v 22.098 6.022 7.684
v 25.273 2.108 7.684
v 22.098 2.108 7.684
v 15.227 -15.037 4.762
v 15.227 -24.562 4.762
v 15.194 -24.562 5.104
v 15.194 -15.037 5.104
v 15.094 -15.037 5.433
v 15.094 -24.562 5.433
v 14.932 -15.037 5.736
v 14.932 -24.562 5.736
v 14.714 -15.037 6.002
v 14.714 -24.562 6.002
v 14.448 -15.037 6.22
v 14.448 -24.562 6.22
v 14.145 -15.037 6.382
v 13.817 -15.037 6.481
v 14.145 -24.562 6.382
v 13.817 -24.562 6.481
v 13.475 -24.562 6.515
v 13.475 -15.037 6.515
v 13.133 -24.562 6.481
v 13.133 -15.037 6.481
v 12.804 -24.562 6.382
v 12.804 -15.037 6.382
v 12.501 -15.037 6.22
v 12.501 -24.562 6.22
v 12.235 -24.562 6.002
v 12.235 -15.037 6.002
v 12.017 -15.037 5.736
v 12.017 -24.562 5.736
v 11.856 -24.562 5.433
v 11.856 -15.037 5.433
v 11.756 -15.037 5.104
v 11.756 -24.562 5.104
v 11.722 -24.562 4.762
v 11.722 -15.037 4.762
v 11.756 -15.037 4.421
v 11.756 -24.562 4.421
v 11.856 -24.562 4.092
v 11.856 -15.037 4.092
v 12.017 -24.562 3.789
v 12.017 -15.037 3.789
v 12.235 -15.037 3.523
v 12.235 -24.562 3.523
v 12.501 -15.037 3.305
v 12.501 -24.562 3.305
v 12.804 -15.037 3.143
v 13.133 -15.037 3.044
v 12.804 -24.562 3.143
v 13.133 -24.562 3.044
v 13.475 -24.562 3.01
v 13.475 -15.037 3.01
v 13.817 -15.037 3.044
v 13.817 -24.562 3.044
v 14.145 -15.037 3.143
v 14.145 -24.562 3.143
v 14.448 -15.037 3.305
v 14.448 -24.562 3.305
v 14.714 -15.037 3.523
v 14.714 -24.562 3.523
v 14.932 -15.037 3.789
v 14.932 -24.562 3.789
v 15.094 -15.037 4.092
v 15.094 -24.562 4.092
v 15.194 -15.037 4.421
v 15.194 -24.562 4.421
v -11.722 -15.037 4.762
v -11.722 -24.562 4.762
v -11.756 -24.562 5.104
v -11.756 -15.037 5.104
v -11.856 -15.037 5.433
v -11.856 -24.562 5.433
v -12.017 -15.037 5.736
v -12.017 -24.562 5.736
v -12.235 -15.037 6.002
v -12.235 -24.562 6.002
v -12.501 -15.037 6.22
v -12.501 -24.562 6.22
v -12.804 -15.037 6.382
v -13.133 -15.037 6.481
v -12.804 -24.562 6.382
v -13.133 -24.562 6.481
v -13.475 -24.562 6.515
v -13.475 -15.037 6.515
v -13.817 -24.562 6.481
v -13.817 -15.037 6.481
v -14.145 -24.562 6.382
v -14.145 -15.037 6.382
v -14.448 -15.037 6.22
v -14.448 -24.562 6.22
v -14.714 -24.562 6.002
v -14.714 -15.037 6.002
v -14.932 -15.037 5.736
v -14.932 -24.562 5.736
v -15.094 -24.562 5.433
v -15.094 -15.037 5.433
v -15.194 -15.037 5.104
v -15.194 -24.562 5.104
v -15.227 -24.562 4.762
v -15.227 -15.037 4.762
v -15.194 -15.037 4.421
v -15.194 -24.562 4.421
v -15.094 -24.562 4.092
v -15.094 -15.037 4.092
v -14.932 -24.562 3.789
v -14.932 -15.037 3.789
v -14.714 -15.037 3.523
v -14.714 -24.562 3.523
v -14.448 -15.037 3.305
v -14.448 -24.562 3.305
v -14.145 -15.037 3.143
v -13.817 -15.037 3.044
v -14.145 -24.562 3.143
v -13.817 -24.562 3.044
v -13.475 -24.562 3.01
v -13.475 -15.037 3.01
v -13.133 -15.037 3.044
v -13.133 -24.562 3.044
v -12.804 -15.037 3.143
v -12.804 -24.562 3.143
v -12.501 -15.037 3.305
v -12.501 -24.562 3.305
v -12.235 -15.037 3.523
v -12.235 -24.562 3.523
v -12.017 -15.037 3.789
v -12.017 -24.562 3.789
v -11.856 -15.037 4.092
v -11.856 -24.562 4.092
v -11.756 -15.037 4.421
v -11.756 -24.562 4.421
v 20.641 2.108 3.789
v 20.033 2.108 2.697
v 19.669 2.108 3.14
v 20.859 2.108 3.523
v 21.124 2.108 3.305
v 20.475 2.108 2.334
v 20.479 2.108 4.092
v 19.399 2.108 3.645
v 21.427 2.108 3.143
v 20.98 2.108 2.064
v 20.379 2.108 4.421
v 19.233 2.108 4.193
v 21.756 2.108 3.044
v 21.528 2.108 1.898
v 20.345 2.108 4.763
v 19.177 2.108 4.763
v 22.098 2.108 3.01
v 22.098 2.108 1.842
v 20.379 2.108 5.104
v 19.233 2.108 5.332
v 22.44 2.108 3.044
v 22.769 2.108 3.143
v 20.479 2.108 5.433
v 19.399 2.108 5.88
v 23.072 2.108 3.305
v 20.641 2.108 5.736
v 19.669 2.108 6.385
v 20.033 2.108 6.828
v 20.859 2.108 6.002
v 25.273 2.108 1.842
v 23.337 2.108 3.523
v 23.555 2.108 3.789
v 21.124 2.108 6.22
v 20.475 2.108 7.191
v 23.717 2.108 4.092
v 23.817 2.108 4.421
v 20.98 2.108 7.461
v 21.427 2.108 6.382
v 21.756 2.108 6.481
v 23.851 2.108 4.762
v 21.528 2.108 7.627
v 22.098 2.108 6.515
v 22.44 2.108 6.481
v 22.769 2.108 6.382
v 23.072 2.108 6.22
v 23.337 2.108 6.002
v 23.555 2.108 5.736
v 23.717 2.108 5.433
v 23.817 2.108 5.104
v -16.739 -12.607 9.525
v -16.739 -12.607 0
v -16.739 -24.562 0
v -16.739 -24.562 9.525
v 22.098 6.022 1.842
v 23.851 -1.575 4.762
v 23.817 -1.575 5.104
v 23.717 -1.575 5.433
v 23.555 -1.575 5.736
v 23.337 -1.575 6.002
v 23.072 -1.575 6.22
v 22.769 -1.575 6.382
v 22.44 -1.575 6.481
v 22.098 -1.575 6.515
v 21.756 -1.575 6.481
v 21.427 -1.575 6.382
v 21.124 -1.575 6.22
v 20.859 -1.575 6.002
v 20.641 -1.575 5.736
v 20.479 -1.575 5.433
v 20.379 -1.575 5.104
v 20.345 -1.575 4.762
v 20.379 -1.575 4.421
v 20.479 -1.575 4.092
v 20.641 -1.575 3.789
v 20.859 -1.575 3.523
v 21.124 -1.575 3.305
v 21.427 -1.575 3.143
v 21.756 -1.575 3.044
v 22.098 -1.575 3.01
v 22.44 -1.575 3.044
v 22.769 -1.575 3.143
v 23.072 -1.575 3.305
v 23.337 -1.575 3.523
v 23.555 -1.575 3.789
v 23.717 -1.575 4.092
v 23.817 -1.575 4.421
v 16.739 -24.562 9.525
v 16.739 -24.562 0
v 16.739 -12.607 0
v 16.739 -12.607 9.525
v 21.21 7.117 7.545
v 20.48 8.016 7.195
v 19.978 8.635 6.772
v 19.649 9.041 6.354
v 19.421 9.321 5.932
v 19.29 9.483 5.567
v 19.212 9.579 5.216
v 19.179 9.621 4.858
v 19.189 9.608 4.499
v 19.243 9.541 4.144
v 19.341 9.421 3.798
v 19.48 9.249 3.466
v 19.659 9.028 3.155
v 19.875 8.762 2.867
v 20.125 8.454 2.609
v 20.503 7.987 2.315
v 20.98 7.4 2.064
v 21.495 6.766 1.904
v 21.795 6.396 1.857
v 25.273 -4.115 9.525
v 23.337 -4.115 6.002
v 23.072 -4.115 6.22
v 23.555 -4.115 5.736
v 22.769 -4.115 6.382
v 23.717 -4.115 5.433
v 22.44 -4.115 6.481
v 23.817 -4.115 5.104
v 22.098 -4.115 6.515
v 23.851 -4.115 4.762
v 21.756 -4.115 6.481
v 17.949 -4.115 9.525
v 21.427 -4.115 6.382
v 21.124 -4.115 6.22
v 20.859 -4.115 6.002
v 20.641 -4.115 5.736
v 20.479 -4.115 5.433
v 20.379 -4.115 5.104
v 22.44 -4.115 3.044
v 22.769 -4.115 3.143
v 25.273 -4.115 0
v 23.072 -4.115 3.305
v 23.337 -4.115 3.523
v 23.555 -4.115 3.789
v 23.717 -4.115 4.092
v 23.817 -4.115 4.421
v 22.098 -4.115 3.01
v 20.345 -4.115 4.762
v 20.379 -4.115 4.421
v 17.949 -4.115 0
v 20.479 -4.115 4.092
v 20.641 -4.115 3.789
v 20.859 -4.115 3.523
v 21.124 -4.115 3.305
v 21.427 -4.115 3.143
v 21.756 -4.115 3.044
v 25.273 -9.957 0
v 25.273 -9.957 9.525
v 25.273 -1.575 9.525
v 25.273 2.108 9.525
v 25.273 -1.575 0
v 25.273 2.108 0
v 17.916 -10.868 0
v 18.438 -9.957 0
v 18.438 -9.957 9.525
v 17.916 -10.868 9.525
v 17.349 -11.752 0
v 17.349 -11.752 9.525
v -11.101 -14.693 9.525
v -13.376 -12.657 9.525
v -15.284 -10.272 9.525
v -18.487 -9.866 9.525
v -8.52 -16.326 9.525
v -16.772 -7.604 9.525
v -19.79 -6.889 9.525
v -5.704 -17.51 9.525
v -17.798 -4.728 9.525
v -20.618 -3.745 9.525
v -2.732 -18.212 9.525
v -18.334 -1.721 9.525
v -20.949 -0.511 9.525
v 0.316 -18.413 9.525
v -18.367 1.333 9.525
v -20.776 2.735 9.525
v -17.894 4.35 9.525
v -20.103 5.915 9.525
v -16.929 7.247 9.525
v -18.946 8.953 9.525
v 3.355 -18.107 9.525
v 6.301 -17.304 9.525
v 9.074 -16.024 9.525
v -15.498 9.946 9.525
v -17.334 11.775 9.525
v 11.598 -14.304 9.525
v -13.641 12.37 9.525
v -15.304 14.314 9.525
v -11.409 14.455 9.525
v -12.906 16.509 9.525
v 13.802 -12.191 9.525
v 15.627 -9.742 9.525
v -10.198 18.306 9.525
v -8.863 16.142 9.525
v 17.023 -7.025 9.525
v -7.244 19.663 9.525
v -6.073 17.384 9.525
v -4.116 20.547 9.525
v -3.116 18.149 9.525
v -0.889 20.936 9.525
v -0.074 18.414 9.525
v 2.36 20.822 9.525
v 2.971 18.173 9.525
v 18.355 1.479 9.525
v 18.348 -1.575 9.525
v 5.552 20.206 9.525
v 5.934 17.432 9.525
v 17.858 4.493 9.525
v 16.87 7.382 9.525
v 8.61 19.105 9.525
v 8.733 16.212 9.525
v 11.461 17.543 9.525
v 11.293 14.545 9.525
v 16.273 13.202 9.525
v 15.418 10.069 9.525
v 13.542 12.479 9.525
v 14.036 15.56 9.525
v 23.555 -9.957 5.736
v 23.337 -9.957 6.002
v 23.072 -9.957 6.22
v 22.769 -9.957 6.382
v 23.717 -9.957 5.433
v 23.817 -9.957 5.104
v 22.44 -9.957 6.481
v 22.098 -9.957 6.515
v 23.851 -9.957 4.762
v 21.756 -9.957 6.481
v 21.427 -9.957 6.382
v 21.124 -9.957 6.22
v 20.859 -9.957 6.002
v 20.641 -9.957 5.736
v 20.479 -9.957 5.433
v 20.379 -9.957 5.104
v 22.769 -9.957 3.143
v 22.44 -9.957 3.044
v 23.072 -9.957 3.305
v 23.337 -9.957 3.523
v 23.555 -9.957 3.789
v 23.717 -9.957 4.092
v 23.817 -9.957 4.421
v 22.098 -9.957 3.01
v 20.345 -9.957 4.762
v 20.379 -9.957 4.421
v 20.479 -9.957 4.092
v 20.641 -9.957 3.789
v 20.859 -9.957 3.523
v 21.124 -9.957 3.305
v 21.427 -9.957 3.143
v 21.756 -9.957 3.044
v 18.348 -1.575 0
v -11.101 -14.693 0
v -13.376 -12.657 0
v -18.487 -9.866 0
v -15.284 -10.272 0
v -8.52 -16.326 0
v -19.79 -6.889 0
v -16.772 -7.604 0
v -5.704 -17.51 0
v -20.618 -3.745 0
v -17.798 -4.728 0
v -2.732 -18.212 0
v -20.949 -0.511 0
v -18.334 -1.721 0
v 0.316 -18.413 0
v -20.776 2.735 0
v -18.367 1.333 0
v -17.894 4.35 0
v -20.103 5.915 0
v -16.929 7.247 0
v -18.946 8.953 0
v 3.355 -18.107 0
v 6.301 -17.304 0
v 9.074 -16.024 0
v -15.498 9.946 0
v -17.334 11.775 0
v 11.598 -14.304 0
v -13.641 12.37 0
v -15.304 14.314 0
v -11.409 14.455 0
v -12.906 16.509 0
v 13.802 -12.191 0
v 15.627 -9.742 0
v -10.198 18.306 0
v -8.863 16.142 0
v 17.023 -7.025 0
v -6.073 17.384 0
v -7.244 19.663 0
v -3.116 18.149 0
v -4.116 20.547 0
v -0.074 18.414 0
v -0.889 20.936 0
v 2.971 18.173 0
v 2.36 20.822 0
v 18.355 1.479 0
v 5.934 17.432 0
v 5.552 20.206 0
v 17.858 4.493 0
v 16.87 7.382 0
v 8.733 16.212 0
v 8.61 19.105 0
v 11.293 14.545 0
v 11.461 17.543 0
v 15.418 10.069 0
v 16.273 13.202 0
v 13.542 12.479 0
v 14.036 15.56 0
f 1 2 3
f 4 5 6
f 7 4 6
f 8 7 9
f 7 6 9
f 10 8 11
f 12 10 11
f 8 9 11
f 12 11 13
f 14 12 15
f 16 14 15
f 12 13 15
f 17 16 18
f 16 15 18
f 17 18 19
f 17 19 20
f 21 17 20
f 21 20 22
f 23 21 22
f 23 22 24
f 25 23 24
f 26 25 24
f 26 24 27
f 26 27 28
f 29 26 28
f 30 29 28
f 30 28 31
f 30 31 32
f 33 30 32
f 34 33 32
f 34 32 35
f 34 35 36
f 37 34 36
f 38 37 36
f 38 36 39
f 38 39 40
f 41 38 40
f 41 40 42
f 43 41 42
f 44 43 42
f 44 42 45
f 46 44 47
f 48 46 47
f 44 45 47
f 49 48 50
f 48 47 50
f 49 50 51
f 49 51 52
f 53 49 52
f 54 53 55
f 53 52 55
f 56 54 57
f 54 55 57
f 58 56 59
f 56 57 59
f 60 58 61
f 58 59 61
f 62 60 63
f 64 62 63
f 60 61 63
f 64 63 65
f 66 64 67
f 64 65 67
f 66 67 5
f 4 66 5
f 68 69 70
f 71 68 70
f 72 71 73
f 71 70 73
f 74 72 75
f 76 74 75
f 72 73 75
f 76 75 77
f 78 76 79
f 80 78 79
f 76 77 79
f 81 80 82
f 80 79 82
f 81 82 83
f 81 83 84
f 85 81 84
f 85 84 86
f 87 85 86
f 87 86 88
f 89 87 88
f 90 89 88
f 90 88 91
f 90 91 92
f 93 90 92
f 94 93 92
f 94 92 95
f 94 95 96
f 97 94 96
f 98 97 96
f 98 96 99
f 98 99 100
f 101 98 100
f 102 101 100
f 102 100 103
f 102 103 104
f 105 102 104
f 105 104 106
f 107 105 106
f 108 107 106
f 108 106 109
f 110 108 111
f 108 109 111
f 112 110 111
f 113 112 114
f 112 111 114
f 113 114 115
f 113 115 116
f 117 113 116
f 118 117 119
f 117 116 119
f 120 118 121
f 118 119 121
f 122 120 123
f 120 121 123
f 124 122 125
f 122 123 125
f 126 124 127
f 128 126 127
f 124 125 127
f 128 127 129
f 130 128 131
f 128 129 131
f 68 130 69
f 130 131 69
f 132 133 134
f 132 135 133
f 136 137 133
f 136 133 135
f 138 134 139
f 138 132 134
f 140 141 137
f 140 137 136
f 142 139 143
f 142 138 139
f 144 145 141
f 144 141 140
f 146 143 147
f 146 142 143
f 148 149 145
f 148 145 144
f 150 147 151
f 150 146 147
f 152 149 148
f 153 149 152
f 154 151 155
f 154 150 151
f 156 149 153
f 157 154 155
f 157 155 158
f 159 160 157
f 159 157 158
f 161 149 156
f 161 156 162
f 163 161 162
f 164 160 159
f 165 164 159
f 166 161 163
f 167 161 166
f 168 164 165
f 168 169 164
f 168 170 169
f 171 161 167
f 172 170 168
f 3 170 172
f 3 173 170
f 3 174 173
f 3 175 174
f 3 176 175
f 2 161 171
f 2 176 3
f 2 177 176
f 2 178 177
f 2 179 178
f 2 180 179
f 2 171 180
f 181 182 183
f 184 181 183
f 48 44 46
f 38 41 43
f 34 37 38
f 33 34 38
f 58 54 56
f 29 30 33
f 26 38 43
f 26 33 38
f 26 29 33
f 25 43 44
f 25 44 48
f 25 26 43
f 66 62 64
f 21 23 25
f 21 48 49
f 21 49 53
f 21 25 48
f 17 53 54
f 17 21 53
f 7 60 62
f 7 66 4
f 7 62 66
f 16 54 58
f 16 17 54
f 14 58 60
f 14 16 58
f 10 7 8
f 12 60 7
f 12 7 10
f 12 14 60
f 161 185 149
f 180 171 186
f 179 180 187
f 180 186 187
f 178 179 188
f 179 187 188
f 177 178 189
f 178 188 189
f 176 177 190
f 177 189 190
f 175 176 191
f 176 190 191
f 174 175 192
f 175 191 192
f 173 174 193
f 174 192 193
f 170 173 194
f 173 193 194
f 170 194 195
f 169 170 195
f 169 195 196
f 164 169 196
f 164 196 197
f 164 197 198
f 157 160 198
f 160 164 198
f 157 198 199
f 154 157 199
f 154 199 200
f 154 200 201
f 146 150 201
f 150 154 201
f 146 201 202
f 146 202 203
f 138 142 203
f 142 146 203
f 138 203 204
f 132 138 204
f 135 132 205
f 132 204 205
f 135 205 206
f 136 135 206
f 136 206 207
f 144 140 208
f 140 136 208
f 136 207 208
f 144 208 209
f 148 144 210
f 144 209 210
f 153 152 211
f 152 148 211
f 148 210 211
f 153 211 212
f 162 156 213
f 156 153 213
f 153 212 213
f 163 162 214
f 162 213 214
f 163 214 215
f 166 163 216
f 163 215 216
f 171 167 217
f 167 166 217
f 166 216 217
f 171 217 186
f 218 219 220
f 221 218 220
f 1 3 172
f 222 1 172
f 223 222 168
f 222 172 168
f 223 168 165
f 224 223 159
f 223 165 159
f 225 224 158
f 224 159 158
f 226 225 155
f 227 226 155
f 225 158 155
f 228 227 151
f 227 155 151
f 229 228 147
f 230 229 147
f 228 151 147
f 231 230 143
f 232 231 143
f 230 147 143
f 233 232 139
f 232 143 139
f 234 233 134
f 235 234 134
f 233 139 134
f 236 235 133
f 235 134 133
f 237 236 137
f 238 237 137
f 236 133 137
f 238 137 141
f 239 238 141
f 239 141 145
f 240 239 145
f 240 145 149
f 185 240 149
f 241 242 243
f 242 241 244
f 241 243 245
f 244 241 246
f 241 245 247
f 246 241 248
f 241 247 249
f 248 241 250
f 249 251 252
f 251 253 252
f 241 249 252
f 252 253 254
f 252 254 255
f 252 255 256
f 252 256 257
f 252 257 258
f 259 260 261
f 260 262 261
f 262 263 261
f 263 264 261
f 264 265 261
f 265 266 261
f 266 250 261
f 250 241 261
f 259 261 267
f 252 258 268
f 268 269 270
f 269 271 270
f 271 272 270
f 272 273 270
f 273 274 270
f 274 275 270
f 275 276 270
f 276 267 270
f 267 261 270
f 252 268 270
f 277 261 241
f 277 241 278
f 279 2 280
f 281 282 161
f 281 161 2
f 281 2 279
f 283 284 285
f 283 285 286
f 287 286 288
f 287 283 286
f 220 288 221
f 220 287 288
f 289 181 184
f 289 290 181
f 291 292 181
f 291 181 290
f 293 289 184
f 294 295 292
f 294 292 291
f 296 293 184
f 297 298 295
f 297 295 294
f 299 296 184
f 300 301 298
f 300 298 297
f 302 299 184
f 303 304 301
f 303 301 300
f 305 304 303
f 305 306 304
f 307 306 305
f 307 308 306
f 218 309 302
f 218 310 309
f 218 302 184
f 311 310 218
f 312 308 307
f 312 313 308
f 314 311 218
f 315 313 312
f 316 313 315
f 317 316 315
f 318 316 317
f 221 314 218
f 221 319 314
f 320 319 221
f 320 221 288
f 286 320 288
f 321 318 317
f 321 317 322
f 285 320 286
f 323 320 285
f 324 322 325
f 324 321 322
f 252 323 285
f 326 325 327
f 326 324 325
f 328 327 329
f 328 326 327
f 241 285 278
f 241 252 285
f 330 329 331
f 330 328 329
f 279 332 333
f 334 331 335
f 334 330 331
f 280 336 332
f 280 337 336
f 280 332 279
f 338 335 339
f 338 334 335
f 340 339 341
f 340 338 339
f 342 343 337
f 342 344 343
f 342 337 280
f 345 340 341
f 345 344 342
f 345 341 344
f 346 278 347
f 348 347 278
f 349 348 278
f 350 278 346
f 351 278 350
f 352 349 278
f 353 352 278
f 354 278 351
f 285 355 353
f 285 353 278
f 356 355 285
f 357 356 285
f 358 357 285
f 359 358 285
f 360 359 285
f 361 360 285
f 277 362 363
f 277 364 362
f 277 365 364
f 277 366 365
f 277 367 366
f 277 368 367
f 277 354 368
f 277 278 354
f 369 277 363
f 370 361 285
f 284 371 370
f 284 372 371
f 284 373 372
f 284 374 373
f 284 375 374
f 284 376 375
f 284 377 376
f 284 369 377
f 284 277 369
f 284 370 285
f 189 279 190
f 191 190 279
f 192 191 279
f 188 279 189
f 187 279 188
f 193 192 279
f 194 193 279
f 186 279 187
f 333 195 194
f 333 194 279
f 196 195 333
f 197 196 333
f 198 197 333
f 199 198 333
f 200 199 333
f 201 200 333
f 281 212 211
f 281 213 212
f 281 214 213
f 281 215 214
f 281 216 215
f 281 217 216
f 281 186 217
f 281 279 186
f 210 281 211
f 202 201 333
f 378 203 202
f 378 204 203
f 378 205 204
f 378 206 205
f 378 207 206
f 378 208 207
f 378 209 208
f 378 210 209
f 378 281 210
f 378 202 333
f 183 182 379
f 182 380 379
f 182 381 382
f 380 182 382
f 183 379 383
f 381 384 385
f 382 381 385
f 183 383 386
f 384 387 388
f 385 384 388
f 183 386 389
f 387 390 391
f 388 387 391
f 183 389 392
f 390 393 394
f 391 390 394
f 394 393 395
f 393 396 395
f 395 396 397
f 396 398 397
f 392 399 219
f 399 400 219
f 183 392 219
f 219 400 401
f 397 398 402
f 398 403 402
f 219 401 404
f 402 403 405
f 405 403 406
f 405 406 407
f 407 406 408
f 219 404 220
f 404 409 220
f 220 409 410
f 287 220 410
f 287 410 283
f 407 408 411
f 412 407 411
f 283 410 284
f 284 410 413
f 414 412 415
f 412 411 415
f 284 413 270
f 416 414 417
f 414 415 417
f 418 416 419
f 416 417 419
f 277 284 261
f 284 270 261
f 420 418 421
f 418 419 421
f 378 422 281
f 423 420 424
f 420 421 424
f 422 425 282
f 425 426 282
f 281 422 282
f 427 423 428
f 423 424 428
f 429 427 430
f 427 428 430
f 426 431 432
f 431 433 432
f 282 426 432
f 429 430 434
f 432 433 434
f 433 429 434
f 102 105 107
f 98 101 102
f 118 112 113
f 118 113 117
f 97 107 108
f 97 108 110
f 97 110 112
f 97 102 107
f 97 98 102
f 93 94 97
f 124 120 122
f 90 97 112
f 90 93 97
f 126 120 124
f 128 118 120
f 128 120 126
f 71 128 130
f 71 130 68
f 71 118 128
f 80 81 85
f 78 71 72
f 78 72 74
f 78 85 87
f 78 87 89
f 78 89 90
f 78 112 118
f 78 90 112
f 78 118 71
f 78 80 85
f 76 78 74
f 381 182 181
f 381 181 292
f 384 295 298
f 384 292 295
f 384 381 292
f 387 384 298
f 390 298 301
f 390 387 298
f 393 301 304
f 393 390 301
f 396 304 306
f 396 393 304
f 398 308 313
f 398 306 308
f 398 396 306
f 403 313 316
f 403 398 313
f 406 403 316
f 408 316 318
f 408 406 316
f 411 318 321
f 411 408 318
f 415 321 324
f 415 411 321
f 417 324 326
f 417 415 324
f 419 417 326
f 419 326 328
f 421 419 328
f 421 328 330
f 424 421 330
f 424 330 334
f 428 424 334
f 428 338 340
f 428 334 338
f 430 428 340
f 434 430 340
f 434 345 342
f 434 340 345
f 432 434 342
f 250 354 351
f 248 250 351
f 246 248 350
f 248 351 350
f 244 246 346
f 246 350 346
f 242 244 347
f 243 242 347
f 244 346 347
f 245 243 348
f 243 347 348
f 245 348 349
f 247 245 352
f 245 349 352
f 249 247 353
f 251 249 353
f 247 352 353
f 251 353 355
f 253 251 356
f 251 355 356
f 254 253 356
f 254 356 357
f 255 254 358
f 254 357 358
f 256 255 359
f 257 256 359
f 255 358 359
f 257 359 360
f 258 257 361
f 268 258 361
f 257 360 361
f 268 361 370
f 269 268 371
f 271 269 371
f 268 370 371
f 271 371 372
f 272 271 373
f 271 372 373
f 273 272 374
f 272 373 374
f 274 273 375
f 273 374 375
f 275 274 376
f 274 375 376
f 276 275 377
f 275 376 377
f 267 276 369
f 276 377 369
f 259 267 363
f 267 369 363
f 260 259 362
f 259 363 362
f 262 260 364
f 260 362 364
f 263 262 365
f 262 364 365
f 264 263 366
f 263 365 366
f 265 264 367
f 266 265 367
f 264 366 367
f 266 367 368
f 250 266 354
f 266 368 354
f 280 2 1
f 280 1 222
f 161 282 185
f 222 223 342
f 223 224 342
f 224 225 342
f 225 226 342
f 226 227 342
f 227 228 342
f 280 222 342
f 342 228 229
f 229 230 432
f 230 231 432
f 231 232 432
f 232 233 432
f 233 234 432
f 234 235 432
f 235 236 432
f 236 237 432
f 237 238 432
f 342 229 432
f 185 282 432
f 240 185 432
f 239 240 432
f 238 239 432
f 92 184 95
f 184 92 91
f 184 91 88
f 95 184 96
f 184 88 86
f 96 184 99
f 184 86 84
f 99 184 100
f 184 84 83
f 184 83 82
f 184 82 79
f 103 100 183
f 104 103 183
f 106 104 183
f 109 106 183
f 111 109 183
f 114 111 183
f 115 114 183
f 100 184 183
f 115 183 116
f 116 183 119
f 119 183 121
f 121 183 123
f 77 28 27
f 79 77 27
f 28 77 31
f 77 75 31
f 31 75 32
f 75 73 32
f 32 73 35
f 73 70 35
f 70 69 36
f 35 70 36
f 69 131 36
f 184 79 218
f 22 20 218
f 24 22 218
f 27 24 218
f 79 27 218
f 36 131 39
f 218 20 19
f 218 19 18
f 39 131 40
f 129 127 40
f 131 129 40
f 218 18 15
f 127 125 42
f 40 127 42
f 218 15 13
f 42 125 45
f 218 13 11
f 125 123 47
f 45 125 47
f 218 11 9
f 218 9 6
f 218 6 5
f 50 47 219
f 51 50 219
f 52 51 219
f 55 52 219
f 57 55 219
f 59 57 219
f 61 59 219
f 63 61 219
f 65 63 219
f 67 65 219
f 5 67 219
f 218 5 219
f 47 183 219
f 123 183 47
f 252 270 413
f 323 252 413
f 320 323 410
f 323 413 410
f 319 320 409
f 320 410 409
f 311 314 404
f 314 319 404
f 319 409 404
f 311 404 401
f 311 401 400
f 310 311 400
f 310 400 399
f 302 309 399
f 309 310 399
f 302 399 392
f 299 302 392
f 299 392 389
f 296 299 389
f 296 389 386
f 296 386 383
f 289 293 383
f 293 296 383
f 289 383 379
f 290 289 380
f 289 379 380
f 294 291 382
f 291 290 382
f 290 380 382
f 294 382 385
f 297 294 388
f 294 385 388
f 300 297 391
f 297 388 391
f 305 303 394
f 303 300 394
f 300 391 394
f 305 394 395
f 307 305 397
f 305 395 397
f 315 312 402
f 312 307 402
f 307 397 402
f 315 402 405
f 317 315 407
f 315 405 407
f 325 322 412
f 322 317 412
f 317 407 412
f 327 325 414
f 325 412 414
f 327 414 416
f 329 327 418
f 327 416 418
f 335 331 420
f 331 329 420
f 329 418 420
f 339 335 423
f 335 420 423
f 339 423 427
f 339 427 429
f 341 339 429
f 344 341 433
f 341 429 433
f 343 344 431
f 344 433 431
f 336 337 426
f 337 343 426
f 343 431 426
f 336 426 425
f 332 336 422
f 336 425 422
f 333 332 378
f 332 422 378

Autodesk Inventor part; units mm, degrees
ref_plane "YZ Plane" through (0, 0, 0) normal (1, 0, 0) x (0, 1, 0)
ref_plane "XZ Plane" through (0, 0, 0) normal (0, 1, 0) x (-1, 0, 0)
ref_plane "XY Plane" through (0, 0, 0) normal (0, 0, 1) x (1, 0, 0)
sketch "Sketch1" plane through (0, 0, 0) normal (0, 0, 1) x (1, 0, 0)
  arc A0 (18.3475, -1.5748) -> (17.9494, -4.1148) centre (0, 0) ccw
  line L0 (-16.7386, -24.5618) -> (16.7386, -24.5618)
  line L1 (16.7386, -24.5618) -> (16.7386, -12.6068)
  line L2 (-16.7386, -12.6068) -> (-16.7386, -24.5618)
  line L3 (-20.955, 0) -> (-20.955, 20.955) construction
  line L4 (-20.955, 20.955) -> (25.273, 20.955) construction
  line L5 (16.7386, -24.5618) -> (25.273, -24.5618) construction
  line L6 (25.273, -24.5618) -> (25.273, -9.9568) construction
  line L7 (25.273, -9.9568) -> (21.0058, -9.9568) construction
  line L8 (25.273, -9.9568) -> (25.273, 2.1082) construction
  line L9 (25.273, 2.1082) -> (16.2735, 13.2017)
  line L10 (25.273, 2.1082) -> (25.273, -1.5748) construction
  line L11 (25.273, -1.5748) -> (18.3475, -1.5748)
  line L12 (25.273, 2.1082) -> (25.273, -1.5748)
  line L13 (25.273, -1.5748) -> (25.273, -4.1148) construction
  line L14 (25.273, -4.1148) -> (25.273, -9.9568)
  line L15 (25.273, -9.9568) -> (18.4384, -9.9568)
  line L16 (25.273, -4.1148) -> (17.9494, -4.1148)
  arc A1 (16.2735, 13.2017) -> (-16.7386, -12.6068) centre (0, 0) ccw
  arc A2 (16.7386, -12.6068) -> (18.4384, -9.9568) centre (0, 0) ccw
  dimension "d0" = 36.83
extrude "Extrusion1" add sketch "Sketch1" along normal blind 9.525
sketch "Sketch2" plane through (-16.7386, -24.5618, 0) normal (0, -1, 0) x (1, 0, 0)
  line L0 (0, 9.525) -> (33.4772, 9.525) projected
  line L1 (16.7386, 0) -> (16.7386, 9.525) construction
  line L2 (30.2133, 4.7625) -> (3.2639, 4.7625) construction
  circle A0 centre (3.2639, 4.7625) radius 1.7526
  circle A1 centre (30.2133, 4.7625) radius 1.7526
  dimension "d12" = 26.9494
  dimension "d13" = 3.5052
  dimension "d14" = 3.5052
extrude "Extrusion2" cut sketch "Sketch2" against normal blind 9.525
thread "Thread1" size "6-32 UNC" class "2B" standard "ANSI Unified Screw Threads" full length
thread "Thread2" size "6-32 UNC" class "2B" standard "ANSI Unified Screw Threads" full length
sketch "Sketch3" plane through (18.4384, -9.9568, 0) normal (0, -1, 0) x (1, 0, 0)
  line L0 (6.8346, 0) -> (6.8346, 9.525) projected
  line L1 (0, 0) -> (0, 9.525) projected
  line L2 (6.8346, 4.7625) -> (3.6596, 4.7625) construction
  circle A0 centre (3.6596, 4.7625) radius 1.7526
  point P0 (-18.4384, 0)
  dimension "d21" = 3.175
  dimension "d22" = 3.5052
extrude "Extrusion3" cut sketch "Sketch3" against normal blind 25.4
sketch "Sketch4" plane through (25.273, -1.5748, 0) normal (1, 0, 0) x (0, 0, -1)
  line L0 (0, 3.683) -> (-9.525, 3.683) projected
  line L1 (-1.8415, 3.683) -> (-7.6835, 3.683)
  line L2 (-7.6835, 3.683) -> (-7.6835, 13.843)
  line L3 (-7.6835, 13.843) -> (-1.8415, 13.843)
  line L4 (-1.8415, 13.843) -> (-1.8415, 3.683)
  point P0 (0, 1.5748)
  dimension "d26" = 10.16
  dimension "d27" = 5.842
extrude "Extrusion4" cut sketch "Sketch4" against normal blind 3.175
sketch "Sketch5" plane through (25.273, 2.1082, 7.6835) normal (0, 1, 0) x (1, 0, 0)
  arc A0 (-3.175, 1.1684) -> (-3.175, 4.6736) centre (-3.175, 2.921) ccw projected
  circle A1 centre (-3.175, 2.921) radius 2.921
  point P0 (-25.273, 7.6835)
extrude "Extrusion5" cut sketch "Sketch5" along normal blind 9.525
thread "Thread3" size "6-32 UNC" class "2B" standard "ANSI Unified Screw Threads" full length
properties part number "Motor Mount"
